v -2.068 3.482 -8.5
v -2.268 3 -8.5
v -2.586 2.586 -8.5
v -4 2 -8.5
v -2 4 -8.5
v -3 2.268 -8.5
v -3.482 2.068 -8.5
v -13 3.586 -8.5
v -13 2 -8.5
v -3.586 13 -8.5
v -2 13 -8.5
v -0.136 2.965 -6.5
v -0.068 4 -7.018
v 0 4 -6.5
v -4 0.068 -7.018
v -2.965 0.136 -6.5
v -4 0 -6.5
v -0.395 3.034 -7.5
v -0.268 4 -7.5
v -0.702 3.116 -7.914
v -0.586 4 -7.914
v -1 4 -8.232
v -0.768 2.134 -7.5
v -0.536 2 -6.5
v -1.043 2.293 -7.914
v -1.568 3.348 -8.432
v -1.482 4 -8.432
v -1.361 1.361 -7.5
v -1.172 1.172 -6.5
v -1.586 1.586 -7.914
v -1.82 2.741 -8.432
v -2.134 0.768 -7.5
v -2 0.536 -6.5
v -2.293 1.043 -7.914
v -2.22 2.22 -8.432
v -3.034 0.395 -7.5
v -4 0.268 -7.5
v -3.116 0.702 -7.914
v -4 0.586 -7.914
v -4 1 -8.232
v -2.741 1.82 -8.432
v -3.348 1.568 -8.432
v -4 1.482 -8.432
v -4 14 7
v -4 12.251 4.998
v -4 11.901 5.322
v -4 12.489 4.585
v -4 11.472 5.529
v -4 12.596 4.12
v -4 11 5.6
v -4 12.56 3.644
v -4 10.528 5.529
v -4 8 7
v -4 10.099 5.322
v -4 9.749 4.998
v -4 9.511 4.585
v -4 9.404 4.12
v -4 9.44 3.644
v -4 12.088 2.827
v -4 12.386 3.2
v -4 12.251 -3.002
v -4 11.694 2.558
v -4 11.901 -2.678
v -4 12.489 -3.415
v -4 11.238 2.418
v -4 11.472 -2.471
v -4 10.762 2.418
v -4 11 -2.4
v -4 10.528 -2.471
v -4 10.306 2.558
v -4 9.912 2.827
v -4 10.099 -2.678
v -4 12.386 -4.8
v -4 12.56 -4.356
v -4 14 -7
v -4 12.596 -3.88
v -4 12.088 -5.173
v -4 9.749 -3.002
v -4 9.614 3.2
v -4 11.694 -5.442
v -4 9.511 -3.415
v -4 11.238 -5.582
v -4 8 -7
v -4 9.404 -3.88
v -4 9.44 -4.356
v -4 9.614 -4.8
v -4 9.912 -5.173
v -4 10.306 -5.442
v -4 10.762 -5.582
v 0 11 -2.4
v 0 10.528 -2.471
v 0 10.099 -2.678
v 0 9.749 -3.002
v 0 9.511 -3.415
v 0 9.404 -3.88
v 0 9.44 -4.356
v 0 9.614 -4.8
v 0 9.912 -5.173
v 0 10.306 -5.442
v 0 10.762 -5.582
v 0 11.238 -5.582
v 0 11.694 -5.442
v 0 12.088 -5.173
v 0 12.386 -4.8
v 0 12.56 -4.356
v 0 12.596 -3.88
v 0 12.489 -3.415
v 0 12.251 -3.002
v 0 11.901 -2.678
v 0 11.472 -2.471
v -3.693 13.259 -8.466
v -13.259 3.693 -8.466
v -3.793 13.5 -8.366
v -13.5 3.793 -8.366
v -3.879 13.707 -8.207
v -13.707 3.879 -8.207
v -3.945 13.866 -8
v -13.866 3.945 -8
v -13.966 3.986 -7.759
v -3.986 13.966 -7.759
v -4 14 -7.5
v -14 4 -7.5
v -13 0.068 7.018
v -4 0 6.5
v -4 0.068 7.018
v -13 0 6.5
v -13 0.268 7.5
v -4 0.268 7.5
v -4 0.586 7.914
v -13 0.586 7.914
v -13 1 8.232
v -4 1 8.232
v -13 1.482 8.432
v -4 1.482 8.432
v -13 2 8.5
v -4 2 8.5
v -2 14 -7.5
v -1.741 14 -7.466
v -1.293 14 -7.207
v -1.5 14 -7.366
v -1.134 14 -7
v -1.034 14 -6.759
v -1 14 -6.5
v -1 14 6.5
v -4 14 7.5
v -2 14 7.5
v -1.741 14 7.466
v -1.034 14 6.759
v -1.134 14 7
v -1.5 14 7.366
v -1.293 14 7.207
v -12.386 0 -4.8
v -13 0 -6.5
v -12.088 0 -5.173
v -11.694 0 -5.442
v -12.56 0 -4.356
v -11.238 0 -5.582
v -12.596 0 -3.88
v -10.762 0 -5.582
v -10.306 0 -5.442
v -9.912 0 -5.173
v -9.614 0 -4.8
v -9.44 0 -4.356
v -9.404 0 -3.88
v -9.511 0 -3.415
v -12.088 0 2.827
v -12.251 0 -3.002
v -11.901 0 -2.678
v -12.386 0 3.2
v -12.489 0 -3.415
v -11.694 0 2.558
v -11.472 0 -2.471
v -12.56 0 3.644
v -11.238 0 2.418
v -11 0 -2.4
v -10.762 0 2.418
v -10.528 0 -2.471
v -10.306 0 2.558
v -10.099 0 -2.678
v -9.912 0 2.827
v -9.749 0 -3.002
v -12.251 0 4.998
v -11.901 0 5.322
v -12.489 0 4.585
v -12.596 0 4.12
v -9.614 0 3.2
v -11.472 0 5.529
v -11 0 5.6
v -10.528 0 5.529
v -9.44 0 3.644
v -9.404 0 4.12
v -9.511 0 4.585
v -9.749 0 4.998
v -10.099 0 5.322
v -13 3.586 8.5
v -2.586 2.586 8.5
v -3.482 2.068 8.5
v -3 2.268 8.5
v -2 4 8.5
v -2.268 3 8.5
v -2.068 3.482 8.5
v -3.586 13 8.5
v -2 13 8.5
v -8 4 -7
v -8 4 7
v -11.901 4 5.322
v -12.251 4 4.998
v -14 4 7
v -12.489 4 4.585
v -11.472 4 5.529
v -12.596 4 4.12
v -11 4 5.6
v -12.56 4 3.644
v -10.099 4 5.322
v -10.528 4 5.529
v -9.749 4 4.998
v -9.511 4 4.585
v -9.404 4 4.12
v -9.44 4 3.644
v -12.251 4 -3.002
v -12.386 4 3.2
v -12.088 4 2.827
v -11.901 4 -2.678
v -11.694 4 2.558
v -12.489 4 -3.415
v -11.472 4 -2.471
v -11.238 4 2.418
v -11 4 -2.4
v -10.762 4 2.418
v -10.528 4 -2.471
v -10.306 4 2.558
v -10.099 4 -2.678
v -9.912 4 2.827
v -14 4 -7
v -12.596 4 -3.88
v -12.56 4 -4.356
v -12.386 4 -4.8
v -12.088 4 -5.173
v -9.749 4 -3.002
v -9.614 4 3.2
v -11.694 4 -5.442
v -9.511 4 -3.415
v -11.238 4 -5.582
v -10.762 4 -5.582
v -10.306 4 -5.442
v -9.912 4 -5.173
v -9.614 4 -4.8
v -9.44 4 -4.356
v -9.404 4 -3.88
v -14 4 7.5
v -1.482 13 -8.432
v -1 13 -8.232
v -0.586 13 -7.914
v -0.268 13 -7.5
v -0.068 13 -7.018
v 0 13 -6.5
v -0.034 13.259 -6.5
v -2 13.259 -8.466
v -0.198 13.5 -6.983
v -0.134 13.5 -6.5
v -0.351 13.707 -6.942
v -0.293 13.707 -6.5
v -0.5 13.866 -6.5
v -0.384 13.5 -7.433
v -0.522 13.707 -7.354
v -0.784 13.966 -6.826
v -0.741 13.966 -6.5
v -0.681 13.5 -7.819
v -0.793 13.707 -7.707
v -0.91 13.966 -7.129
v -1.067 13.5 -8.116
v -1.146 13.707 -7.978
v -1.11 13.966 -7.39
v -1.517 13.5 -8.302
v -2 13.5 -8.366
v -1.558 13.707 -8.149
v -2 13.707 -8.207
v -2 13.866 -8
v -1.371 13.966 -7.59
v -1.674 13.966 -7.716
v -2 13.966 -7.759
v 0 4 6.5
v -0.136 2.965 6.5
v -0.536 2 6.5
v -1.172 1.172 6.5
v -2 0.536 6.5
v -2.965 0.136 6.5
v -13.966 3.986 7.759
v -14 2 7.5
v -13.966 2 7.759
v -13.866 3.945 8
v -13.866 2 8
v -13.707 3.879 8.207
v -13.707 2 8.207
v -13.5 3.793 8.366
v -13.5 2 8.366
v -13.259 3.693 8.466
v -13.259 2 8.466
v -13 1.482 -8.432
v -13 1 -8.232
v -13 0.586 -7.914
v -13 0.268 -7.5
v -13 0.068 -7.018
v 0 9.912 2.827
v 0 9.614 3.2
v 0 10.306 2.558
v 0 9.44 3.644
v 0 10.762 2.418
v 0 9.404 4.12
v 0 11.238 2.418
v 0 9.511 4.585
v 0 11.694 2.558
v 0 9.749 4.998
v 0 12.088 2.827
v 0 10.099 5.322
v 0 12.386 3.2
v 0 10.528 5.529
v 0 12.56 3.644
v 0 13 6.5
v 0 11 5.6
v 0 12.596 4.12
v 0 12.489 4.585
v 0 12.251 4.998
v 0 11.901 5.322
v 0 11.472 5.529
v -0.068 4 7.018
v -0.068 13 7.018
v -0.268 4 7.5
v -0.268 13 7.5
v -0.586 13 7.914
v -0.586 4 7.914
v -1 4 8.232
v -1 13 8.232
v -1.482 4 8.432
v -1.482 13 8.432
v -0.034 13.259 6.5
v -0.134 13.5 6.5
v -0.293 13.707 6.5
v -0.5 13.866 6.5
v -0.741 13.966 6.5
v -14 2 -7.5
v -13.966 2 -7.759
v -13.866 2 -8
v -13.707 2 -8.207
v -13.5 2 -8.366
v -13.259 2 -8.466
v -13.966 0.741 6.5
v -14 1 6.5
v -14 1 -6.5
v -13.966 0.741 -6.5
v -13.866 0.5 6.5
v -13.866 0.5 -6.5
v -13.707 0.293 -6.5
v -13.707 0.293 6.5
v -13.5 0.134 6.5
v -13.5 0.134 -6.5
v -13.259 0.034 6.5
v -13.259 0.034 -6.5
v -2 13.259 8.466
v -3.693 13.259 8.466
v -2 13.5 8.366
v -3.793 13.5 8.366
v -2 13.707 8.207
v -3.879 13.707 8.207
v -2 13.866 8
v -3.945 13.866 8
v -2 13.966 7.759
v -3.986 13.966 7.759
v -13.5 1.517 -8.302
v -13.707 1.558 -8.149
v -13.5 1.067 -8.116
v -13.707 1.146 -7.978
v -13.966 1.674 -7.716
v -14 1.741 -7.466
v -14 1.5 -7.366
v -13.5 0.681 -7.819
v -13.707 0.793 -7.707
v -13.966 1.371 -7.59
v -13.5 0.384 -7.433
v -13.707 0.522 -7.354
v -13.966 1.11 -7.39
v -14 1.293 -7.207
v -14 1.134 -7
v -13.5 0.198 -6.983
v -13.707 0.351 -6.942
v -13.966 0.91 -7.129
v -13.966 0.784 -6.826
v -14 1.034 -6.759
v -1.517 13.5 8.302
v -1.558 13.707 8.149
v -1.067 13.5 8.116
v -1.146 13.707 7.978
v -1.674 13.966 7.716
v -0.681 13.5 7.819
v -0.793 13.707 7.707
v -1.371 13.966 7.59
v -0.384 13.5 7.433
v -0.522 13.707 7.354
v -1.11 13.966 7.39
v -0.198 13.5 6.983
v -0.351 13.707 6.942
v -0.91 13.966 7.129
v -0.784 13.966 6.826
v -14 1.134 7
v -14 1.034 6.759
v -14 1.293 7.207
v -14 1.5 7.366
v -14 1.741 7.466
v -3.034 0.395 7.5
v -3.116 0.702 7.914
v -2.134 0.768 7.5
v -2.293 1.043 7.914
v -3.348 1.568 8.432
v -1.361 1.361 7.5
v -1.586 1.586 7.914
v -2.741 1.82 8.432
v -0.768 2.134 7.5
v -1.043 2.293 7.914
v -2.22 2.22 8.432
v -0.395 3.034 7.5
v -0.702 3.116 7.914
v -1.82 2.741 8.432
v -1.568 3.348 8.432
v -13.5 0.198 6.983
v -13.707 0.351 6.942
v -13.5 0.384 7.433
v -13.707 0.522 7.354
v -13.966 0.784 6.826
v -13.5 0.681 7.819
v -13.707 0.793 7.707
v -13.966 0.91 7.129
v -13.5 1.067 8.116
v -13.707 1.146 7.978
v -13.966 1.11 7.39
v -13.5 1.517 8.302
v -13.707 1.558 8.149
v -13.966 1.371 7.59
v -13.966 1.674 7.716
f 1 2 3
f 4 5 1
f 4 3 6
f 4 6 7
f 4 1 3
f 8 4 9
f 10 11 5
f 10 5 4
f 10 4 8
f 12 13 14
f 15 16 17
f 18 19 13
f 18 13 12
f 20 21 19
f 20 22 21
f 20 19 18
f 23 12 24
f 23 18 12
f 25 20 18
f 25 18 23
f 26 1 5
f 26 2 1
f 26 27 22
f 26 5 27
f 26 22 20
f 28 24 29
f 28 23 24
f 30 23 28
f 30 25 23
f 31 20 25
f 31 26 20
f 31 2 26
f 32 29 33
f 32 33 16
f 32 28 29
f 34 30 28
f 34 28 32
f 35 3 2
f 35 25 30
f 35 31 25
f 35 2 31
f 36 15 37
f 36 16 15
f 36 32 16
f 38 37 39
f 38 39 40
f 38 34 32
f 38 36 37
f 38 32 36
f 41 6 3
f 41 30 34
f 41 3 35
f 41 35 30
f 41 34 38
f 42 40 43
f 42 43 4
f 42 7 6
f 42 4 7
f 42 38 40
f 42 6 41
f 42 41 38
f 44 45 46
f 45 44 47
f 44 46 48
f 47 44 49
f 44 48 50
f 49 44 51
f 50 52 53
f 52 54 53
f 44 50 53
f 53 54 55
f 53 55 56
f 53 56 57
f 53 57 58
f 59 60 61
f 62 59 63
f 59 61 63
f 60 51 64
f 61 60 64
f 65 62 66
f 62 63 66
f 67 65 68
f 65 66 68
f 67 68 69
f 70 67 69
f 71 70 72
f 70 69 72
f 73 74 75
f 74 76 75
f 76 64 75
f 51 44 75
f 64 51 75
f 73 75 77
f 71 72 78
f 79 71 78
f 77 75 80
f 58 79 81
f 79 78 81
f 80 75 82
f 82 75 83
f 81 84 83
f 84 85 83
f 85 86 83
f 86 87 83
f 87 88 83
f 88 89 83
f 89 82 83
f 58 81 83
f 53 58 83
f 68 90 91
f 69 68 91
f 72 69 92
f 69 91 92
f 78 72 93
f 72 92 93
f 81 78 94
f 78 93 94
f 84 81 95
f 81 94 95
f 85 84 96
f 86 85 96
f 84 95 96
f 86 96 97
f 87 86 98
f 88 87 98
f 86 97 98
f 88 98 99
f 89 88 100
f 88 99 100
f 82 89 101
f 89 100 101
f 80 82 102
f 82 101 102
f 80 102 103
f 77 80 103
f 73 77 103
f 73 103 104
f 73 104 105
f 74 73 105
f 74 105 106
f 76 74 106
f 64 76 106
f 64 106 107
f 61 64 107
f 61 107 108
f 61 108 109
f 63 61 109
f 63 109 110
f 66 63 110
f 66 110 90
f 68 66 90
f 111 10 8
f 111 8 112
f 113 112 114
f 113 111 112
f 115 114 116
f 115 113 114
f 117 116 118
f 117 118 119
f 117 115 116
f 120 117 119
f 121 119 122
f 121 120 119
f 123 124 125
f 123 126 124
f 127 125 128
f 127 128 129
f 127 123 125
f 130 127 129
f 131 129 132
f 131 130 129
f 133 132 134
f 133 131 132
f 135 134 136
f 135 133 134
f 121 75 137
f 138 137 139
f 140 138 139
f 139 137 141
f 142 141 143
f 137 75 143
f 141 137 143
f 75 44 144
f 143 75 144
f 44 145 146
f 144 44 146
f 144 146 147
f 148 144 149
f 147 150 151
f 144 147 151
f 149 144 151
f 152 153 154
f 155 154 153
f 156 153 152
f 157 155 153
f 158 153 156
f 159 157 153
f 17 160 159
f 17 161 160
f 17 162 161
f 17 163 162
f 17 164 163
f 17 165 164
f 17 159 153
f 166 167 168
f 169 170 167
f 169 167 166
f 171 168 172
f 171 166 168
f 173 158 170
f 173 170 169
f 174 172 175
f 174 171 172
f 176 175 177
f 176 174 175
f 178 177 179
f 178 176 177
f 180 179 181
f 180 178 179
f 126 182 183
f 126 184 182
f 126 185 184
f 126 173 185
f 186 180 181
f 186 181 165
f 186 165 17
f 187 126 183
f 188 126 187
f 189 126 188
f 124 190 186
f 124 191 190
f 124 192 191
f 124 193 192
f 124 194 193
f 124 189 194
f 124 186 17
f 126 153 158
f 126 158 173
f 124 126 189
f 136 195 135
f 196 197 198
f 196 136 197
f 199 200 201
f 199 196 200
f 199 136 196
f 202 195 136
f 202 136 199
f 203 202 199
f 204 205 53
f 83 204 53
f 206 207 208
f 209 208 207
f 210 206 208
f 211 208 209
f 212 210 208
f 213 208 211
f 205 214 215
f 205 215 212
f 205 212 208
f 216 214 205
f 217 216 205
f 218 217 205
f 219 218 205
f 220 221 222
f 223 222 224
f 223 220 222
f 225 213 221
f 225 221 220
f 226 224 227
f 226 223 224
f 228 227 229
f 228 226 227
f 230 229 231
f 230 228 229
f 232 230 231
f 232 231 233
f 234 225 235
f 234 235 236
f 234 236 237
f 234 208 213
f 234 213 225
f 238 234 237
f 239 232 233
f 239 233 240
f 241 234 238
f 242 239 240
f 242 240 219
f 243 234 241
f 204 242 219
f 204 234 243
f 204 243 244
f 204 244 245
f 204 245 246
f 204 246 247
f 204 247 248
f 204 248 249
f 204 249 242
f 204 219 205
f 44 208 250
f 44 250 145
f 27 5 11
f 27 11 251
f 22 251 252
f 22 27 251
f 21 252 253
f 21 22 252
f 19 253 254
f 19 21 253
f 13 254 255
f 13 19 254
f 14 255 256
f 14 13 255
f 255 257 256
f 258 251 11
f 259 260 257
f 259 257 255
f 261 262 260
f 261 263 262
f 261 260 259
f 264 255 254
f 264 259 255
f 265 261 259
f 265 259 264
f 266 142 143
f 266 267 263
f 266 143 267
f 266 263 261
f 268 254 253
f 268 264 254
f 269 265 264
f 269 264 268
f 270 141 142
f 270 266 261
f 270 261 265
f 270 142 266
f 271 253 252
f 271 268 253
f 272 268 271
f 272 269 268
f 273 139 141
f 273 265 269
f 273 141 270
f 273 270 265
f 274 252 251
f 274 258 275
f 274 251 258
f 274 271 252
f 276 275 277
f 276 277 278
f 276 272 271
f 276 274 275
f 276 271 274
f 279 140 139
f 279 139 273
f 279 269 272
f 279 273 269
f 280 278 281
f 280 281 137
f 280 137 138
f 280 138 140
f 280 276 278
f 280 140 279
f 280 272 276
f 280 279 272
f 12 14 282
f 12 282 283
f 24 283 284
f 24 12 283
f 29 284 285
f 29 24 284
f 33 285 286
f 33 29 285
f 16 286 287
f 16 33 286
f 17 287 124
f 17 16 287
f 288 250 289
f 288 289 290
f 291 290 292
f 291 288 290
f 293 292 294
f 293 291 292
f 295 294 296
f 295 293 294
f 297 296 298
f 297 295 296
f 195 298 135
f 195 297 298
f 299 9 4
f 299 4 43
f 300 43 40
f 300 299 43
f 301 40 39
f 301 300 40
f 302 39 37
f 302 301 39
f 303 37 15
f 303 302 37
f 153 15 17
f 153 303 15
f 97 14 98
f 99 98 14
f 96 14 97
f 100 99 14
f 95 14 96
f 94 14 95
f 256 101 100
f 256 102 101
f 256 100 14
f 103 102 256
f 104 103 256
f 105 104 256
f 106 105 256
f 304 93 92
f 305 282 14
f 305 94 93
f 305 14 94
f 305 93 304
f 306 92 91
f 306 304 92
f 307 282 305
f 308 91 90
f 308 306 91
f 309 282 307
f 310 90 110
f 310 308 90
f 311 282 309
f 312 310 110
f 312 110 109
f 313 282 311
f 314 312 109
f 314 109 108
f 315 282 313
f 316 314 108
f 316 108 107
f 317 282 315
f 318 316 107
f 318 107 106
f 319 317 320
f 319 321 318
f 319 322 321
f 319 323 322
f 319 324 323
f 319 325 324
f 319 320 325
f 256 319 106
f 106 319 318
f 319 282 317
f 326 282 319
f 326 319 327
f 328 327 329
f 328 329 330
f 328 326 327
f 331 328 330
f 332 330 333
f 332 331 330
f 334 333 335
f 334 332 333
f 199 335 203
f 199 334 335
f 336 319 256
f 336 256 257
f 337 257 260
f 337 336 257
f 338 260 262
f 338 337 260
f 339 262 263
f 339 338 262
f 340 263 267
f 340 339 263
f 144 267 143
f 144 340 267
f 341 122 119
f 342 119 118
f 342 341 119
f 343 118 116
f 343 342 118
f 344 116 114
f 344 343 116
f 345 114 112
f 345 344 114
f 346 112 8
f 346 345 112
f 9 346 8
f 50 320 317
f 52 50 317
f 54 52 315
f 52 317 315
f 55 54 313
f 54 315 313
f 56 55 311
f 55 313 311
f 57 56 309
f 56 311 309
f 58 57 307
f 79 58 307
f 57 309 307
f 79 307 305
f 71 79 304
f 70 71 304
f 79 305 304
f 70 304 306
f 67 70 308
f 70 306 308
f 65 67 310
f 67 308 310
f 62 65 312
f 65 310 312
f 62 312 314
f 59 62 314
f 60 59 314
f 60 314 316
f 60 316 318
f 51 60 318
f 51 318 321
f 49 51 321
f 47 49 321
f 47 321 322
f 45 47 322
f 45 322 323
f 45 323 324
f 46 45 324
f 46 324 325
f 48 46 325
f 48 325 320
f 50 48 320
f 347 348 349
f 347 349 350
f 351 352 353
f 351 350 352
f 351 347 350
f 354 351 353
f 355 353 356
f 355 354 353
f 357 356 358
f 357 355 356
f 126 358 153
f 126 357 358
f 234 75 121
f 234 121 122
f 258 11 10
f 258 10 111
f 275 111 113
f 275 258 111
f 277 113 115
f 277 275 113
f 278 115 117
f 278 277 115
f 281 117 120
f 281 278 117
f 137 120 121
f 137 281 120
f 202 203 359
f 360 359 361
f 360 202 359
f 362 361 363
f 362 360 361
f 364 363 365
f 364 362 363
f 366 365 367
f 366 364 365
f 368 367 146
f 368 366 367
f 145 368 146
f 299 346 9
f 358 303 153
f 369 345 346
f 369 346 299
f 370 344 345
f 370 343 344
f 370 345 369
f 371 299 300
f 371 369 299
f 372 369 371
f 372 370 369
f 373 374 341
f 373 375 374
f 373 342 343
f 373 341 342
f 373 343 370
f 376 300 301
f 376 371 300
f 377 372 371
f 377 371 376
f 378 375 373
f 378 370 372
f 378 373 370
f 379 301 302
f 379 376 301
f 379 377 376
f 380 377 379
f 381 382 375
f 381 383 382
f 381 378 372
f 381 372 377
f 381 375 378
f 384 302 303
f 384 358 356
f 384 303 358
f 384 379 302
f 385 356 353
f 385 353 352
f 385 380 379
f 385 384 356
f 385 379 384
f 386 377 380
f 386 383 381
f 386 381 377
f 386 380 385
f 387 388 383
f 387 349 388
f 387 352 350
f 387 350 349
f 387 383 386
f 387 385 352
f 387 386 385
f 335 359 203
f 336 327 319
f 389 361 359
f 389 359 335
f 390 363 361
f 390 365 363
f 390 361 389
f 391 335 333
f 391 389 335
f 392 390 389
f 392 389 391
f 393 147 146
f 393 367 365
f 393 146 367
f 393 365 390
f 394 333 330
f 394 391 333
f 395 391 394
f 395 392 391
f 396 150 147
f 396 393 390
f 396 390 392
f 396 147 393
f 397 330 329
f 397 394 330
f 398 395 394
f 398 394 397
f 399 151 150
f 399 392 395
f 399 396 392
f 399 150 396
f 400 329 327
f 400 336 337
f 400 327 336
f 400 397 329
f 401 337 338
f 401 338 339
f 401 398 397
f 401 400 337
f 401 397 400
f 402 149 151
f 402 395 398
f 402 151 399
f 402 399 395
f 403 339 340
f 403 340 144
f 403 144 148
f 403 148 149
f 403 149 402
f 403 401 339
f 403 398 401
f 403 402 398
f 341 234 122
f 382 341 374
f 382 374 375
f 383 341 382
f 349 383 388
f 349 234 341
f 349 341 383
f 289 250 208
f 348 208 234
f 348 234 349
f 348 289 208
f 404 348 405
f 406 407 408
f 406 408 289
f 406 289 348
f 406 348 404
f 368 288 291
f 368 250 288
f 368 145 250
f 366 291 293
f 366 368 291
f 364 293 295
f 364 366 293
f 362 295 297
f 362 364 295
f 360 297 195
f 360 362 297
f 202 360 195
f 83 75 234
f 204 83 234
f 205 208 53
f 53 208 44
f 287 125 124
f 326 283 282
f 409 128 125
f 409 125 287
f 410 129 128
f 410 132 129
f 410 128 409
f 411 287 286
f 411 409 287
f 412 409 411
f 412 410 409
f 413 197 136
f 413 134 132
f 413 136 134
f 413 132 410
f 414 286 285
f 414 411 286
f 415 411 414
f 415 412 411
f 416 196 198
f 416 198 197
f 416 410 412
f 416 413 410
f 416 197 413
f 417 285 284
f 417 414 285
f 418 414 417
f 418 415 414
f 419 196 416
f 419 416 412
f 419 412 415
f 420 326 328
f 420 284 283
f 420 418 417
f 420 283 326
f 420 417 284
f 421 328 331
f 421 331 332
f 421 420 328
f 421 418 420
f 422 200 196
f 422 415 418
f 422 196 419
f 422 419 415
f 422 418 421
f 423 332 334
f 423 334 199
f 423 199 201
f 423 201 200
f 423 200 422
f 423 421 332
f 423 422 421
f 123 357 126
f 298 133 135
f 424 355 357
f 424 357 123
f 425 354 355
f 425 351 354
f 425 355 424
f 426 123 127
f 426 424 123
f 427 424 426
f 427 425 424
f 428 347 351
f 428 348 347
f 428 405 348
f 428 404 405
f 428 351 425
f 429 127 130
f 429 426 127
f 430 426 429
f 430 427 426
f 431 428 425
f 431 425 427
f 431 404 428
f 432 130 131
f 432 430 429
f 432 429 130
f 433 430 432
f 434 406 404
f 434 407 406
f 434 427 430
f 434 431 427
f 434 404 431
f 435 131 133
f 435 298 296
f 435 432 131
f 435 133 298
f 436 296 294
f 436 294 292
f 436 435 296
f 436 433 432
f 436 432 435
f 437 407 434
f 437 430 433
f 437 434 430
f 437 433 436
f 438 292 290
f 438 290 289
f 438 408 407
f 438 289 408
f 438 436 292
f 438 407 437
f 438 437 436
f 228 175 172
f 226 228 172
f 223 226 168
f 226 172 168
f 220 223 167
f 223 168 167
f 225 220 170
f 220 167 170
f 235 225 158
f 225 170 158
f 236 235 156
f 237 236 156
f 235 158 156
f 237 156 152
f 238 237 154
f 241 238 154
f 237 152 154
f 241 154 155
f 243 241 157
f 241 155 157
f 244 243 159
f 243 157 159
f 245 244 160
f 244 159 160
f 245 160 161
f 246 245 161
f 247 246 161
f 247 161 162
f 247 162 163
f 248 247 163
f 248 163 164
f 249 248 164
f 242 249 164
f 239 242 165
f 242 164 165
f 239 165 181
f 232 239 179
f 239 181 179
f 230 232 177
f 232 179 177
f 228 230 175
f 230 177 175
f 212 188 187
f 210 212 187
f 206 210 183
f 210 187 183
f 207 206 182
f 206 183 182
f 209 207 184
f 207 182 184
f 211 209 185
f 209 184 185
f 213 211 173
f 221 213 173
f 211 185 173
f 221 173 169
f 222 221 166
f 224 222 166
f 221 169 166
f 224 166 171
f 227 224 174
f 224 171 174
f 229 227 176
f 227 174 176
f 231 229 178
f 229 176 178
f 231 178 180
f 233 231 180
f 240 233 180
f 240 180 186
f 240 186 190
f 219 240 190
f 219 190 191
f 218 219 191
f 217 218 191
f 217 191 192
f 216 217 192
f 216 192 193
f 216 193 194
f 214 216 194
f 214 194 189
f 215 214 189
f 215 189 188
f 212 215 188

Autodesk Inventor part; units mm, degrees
ref_plane "YZ Plane" through (0, 0, 0) normal (1, 0, 0) x (0, 1, 0)
ref_plane "XZ Plane" through (0, 0, 0) normal (0, 1, 0) x (-1, 0, 0)
ref_plane "XY Plane" through (0, 0, 0) normal (0, 0, 1) x (1, 0, 0)
sketch "スケッチ1" plane through (0, 0, 0) normal (0, 0, 1) x (1, 0, 0)
  line L0 (0, 0) -> (-14, 0)
  line L1 (-14, 0) -> (-14, 14)
  line L2 (-14, 14) -> (0, 14)
  line L3 (0, 14) -> (0, 0)
  line L4 (-4, 14) -> (-14, 4)
  line L5 (-14, 4) -> (0, 4)
  line L6 (-4, 14) -> (-4, 0)
  line L7 (-4, 8) -> (-8, 4)
  dimension "d0" = 14
  dimension "d1" = 14
  dimension "d2" = 4
  dimension "d3" = 4
  dimension "d4" = 6
extrude "押し出し1" add sketch "スケッチ1" along normal blind 7 contours L0 L6 L5 L3 | L0 L1 L5 L6 | L5 L6 L2 L3 | L5 L7 L6
sketch "スケッチ2" plane through (0, 0, 7) normal (0, 0, 1) x (1, 0, 0)
  line L0 (-8, 4) -> (-14, 4) projected
  line L1 (0, 14) -> (-4, 14) projected
  line L2 (-14, 4) -> (-4, 14)
  line L3 (-4, 14) -> (0, 14)
  line L4 (0, 14) -> (0, 0)
  line L5 (0, 0) -> (-14, 0)
  line L6 (-14, 0) -> (-14, 4)
extrude "押し出し2" add sketch "スケッチ2" along normal blind 1.5
mirror "ミラー1" about plane through (-7, 7, 0) normal (0, 0, -1) of "押し出し1", "押し出し2"
sketch "スケッチ3" plane through (-4, 8, 7) normal (-1, 0, 0) x (0, 0, 1)
  line L0 (-14, 6) -> (0, 6) projected
  line L1 (-7, 6) -> (-7, 0)
  line L2 (0, 0) -> (-14, 0) projected
  line L3 (-14, 6) -> (-14, 0) projected
  line L4 (-14, 3) -> (0, 3)
  line L5 (0, 6) -> (0, -4) projected
  line L6 (-15.5, -8) -> (1.5, -8) projected
  point P0 (-7, -8)
  point P1 (-7, 3)
  point P2 (-3, 3)
  point P3 (-11, 3)
  dimension "d10" = 4
  dimension "d30" = 3
hole "穴1" at (-4, 11, -4) at (-4, 11, 4) direction (1, 0, 0) diameter 3.2 depth 20 tip angle 118
sketch "スケッチ4" plane through (-14, 4, 7) normal (0, 1, 0) x (1, 0, 0)
  line L0 (0, 14) -> (0, 0) projected
  line L1 (0, 7) -> (6, 7)
  line L2 (6, 14) -> (6, 0) projected
  line L3 (6, 0) -> (0, 0) projected
  line L4 (3, 0) -> (3, 14)
  line L5 (6, 14) -> (0, 14) projected
  point P0 (14, 7)
  point P1 (3, 7)
  point P2 (3, 3)
  point P3 (3, 11)
  dimension "d18" = 3
  dimension "d19" = 4
hole "穴2" at (-11, 4, -4) at (-11, 4, 4) direction (0, -1, 0) diameter 3.2 depth 20 tip angle 118
fillet "フィレット1" radius 4 1 edges at (0, 0, 0)
fillet "フィレット2" radius 2 6 edges at (-1.1716, 1.1716, 8.5) (0, 9, 8.5) (-9, 0, 8.5) (0, 9, -8.5) (-9, 0, -8.5) (-1.1716, 1.1716, -8.5)
fillet "フィレット3" radius 1 12 edges at (-0.5858, 14, 7.9142) (-3, 14, 8.5) (-0.5858, 14, -7.9142) (-3, 14, -8.5) (0, 14, 0) (-9, 9, 8.5) (-9, 9, -8.5) (-14, 0.5858, 7.9142) (-14, 3, 8.5) (-14, 0.5858, -7.9142) (-14, 3, -8.5) (-14, 0, 0)
properties part number "link2part3"
